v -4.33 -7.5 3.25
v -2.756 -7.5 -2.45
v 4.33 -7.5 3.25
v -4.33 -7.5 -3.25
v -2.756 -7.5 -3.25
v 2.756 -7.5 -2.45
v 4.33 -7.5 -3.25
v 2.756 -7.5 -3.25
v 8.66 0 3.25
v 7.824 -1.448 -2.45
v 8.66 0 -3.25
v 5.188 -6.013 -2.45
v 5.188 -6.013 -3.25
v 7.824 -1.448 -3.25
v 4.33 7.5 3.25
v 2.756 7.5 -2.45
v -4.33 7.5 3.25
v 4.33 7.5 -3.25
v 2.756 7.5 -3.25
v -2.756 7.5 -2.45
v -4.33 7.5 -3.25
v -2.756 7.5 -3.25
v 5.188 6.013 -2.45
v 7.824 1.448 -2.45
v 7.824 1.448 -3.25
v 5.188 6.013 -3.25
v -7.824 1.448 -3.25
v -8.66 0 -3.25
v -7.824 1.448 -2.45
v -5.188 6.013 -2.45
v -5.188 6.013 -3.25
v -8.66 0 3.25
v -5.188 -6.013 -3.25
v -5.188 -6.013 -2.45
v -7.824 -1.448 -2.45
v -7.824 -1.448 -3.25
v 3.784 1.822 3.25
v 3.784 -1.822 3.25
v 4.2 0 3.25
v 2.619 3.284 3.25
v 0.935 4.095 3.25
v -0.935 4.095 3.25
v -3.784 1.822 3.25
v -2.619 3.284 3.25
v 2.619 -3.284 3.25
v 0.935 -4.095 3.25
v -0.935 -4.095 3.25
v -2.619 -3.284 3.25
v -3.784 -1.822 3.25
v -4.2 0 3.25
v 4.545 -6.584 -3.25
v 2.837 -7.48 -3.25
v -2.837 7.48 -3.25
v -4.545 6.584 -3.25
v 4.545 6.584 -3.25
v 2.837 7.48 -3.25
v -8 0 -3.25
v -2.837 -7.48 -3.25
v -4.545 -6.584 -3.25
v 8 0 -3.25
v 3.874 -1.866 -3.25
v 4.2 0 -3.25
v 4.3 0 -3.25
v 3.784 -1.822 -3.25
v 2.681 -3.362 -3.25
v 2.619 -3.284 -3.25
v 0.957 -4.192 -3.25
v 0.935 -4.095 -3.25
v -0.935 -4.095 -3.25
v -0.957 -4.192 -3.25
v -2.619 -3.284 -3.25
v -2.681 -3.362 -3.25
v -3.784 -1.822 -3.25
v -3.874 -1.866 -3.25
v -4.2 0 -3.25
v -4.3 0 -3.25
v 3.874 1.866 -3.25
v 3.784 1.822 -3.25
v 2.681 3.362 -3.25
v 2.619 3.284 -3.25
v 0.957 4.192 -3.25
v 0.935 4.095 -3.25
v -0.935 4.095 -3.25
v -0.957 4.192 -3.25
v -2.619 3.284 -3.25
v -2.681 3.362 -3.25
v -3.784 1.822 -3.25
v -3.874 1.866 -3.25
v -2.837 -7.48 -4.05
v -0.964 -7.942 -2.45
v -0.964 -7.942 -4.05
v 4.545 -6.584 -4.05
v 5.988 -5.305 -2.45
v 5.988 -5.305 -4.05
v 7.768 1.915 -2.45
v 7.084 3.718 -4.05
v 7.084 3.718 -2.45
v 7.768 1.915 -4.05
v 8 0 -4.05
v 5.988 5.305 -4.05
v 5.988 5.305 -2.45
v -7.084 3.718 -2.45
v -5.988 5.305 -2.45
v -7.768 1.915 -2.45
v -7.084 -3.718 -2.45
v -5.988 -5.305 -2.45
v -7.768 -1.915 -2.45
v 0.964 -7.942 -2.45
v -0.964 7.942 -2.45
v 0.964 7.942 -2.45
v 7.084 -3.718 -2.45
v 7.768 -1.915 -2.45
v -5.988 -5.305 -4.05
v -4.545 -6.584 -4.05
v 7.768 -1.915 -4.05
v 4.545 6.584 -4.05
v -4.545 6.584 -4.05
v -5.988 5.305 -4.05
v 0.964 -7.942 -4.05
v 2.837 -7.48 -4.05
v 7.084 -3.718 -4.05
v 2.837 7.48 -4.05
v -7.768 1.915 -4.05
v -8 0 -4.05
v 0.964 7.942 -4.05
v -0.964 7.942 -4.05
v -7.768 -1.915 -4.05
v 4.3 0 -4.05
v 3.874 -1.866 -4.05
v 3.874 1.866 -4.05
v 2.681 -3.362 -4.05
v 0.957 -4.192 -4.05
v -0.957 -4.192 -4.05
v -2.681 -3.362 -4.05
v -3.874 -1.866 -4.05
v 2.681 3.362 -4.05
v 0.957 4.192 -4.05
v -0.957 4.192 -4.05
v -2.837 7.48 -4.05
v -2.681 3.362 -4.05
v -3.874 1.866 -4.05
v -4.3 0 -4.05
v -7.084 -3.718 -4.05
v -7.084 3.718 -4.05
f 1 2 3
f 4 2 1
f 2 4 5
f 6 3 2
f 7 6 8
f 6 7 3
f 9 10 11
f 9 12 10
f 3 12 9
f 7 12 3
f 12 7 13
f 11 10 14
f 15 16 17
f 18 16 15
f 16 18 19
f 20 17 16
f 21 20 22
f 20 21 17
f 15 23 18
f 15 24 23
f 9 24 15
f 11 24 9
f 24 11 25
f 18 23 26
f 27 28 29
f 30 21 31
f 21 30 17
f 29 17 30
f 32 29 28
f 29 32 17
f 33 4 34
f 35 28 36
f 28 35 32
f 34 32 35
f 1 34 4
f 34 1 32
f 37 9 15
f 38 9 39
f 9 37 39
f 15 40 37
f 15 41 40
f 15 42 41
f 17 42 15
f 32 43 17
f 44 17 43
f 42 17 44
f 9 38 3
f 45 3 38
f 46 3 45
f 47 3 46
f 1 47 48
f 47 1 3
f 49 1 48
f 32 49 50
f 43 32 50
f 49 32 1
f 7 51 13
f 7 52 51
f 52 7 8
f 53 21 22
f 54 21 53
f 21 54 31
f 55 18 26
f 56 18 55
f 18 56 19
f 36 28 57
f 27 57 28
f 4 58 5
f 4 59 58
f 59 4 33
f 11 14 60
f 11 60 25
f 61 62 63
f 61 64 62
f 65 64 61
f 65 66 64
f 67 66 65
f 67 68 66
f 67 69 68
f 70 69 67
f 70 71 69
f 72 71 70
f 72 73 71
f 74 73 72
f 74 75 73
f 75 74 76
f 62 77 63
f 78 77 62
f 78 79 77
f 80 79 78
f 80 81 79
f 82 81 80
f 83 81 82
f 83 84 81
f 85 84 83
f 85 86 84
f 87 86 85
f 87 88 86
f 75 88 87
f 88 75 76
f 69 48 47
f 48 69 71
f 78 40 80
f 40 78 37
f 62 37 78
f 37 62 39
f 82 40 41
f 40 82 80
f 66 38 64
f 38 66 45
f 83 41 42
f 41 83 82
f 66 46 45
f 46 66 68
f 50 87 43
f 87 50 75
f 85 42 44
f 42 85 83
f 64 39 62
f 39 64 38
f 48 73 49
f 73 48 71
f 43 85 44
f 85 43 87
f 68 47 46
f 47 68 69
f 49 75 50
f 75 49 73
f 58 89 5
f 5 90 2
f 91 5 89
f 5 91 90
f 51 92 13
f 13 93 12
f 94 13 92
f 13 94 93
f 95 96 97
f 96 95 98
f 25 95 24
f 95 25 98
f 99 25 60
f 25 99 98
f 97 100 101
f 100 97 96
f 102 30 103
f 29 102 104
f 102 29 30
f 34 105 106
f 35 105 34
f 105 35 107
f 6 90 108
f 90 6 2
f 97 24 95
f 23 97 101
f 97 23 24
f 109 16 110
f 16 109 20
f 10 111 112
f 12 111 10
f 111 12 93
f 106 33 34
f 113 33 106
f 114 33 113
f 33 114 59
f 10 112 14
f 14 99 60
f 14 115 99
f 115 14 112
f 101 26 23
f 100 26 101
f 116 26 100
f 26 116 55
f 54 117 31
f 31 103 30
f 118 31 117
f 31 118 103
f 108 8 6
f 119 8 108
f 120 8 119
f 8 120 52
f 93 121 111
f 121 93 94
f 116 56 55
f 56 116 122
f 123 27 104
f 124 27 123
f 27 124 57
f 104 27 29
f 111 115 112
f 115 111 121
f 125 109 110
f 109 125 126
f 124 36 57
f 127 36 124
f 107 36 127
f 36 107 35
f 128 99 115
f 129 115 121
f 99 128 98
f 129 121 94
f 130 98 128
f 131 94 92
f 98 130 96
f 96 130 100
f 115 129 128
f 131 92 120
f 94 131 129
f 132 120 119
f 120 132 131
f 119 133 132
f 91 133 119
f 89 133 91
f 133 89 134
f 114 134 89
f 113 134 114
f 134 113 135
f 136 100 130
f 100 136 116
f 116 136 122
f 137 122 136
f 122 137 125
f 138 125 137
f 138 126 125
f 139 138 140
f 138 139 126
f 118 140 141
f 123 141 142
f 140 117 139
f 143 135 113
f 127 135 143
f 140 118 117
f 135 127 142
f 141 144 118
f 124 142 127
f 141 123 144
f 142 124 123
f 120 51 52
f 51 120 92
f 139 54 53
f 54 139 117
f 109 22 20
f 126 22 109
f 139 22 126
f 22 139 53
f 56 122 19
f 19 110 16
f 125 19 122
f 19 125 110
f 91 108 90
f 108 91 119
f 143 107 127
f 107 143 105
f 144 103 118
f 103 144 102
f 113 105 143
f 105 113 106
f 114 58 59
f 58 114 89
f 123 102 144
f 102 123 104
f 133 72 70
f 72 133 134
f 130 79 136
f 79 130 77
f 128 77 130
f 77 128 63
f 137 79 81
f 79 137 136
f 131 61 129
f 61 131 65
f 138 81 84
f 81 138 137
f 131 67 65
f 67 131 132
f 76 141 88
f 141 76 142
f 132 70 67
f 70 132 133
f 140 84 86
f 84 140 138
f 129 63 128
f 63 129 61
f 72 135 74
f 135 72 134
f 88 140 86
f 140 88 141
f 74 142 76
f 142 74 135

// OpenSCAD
// Parameters
thread_diameter_mm = 8.0; //[4.0:16.0:0.1]
across_flats_mm = 15.0; //[7.5:30.0:0.1]
thickness_mm = 6.5; //[3.25:13.0:0.1]
hole_clearance_mm = 0.4; //[0.0:1.5:0.05]
hole_type_is_threaded = 0; //[0:1:1]
thread_pitch_mm = 1.25; //[0.5:2.5:0.05]
chamfer_mm = 0.6; //[0.2:1.5:0.05]
chamfer_angle_deg = 45; //[30:60:1]
eps_mm = 0.8; //[0.2:2.0:0.1]
washer_enabled = 1; //[0:1:1]
washer_outer_diameter_mm = 16.0; //[8.0:32.0:0.1]
washer_thickness_mm = 1.6; //[0.8:3.2:0.1]
washer_hole_clearance_mm = 0.6; //[0.0:2.0:0.05]
thread_representation_enabled = 0; //[0:1:1]
thread_groove_depth_mm = 0.25; //[0.1:0.6:0.05]
thread_groove_count = 18; //[6:48:1]

// Nut and Washer - complete geometry
module nut_and_washer() {
  color("DimGray") {
    // Hex Nut Body
    difference() {
      cylinder(r=across_flats_mm/(2*cos(30)), h=thickness_mm, center=true, $fn=6);
      // Central Through Hole
      cylinder(r=(thread_diameter_mm + hole_clearance_mm*(1-hole_type_is_threaded))/2, h=thickness_mm + 2*eps_mm, center=true);
      // Chamfers
      translate([0, 0, thickness_mm/2 - chamfer_mm/2 + eps_mm/2])
        rotate([180, 0, 0])
        cylinder(r1=(thread_diameter_mm + hole_clearance_mm*(1-hole_type_is_threaded))/2 + chamfer_mm, r2=0, h=chamfer_mm, center=true);
      translate([0, 0, -thickness_mm/2 + chamfer_mm/2 - eps_mm/2])
        cylinder(r1=(thread_diameter_mm + hole_clearance_mm*(1-hole_type_is_threaded))/2 + chamfer_mm, r2=0, h=chamfer_mm, center=true);
    }
    
    // Washer
    if (washer_enabled) {
      translate([0, 0, -thickness_mm/2 - washer_thickness_mm/2 + eps_mm])
        difference() {
          cylinder(r=washer_outer_diameter_mm/2, h=washer_thickness_mm, center=true);
          cylinder(r=(thread_diameter_mm + washer_hole_clearance_mm)/2, h=washer_thickness_mm + 2*eps_mm, center=true);
        }
    }
  }
  
  // Thread Representation (optional)
  if (thread_representation_enabled) {
    difference() {
      union() {
        for (i = [0:thread_groove_count-1]) {
          rotate([0, 0, i*360/thread_groove_count])
            translate([(thread_diameter_mm + hole_clearance_mm*(1-hole_type_is_threaded))/2 - thread_groove_depth_mm/2, 0, 0])
            cube([thread_groove_depth_mm, (thread_diameter_mm + hole_clearance_mm*(1-hole_type_is_threaded)), thickness_mm + 2*eps_mm], center=true);
        }
      }
    }
  }
}

// Assembly
module assembly() {
  nut_and_washer();
}

assembly();
